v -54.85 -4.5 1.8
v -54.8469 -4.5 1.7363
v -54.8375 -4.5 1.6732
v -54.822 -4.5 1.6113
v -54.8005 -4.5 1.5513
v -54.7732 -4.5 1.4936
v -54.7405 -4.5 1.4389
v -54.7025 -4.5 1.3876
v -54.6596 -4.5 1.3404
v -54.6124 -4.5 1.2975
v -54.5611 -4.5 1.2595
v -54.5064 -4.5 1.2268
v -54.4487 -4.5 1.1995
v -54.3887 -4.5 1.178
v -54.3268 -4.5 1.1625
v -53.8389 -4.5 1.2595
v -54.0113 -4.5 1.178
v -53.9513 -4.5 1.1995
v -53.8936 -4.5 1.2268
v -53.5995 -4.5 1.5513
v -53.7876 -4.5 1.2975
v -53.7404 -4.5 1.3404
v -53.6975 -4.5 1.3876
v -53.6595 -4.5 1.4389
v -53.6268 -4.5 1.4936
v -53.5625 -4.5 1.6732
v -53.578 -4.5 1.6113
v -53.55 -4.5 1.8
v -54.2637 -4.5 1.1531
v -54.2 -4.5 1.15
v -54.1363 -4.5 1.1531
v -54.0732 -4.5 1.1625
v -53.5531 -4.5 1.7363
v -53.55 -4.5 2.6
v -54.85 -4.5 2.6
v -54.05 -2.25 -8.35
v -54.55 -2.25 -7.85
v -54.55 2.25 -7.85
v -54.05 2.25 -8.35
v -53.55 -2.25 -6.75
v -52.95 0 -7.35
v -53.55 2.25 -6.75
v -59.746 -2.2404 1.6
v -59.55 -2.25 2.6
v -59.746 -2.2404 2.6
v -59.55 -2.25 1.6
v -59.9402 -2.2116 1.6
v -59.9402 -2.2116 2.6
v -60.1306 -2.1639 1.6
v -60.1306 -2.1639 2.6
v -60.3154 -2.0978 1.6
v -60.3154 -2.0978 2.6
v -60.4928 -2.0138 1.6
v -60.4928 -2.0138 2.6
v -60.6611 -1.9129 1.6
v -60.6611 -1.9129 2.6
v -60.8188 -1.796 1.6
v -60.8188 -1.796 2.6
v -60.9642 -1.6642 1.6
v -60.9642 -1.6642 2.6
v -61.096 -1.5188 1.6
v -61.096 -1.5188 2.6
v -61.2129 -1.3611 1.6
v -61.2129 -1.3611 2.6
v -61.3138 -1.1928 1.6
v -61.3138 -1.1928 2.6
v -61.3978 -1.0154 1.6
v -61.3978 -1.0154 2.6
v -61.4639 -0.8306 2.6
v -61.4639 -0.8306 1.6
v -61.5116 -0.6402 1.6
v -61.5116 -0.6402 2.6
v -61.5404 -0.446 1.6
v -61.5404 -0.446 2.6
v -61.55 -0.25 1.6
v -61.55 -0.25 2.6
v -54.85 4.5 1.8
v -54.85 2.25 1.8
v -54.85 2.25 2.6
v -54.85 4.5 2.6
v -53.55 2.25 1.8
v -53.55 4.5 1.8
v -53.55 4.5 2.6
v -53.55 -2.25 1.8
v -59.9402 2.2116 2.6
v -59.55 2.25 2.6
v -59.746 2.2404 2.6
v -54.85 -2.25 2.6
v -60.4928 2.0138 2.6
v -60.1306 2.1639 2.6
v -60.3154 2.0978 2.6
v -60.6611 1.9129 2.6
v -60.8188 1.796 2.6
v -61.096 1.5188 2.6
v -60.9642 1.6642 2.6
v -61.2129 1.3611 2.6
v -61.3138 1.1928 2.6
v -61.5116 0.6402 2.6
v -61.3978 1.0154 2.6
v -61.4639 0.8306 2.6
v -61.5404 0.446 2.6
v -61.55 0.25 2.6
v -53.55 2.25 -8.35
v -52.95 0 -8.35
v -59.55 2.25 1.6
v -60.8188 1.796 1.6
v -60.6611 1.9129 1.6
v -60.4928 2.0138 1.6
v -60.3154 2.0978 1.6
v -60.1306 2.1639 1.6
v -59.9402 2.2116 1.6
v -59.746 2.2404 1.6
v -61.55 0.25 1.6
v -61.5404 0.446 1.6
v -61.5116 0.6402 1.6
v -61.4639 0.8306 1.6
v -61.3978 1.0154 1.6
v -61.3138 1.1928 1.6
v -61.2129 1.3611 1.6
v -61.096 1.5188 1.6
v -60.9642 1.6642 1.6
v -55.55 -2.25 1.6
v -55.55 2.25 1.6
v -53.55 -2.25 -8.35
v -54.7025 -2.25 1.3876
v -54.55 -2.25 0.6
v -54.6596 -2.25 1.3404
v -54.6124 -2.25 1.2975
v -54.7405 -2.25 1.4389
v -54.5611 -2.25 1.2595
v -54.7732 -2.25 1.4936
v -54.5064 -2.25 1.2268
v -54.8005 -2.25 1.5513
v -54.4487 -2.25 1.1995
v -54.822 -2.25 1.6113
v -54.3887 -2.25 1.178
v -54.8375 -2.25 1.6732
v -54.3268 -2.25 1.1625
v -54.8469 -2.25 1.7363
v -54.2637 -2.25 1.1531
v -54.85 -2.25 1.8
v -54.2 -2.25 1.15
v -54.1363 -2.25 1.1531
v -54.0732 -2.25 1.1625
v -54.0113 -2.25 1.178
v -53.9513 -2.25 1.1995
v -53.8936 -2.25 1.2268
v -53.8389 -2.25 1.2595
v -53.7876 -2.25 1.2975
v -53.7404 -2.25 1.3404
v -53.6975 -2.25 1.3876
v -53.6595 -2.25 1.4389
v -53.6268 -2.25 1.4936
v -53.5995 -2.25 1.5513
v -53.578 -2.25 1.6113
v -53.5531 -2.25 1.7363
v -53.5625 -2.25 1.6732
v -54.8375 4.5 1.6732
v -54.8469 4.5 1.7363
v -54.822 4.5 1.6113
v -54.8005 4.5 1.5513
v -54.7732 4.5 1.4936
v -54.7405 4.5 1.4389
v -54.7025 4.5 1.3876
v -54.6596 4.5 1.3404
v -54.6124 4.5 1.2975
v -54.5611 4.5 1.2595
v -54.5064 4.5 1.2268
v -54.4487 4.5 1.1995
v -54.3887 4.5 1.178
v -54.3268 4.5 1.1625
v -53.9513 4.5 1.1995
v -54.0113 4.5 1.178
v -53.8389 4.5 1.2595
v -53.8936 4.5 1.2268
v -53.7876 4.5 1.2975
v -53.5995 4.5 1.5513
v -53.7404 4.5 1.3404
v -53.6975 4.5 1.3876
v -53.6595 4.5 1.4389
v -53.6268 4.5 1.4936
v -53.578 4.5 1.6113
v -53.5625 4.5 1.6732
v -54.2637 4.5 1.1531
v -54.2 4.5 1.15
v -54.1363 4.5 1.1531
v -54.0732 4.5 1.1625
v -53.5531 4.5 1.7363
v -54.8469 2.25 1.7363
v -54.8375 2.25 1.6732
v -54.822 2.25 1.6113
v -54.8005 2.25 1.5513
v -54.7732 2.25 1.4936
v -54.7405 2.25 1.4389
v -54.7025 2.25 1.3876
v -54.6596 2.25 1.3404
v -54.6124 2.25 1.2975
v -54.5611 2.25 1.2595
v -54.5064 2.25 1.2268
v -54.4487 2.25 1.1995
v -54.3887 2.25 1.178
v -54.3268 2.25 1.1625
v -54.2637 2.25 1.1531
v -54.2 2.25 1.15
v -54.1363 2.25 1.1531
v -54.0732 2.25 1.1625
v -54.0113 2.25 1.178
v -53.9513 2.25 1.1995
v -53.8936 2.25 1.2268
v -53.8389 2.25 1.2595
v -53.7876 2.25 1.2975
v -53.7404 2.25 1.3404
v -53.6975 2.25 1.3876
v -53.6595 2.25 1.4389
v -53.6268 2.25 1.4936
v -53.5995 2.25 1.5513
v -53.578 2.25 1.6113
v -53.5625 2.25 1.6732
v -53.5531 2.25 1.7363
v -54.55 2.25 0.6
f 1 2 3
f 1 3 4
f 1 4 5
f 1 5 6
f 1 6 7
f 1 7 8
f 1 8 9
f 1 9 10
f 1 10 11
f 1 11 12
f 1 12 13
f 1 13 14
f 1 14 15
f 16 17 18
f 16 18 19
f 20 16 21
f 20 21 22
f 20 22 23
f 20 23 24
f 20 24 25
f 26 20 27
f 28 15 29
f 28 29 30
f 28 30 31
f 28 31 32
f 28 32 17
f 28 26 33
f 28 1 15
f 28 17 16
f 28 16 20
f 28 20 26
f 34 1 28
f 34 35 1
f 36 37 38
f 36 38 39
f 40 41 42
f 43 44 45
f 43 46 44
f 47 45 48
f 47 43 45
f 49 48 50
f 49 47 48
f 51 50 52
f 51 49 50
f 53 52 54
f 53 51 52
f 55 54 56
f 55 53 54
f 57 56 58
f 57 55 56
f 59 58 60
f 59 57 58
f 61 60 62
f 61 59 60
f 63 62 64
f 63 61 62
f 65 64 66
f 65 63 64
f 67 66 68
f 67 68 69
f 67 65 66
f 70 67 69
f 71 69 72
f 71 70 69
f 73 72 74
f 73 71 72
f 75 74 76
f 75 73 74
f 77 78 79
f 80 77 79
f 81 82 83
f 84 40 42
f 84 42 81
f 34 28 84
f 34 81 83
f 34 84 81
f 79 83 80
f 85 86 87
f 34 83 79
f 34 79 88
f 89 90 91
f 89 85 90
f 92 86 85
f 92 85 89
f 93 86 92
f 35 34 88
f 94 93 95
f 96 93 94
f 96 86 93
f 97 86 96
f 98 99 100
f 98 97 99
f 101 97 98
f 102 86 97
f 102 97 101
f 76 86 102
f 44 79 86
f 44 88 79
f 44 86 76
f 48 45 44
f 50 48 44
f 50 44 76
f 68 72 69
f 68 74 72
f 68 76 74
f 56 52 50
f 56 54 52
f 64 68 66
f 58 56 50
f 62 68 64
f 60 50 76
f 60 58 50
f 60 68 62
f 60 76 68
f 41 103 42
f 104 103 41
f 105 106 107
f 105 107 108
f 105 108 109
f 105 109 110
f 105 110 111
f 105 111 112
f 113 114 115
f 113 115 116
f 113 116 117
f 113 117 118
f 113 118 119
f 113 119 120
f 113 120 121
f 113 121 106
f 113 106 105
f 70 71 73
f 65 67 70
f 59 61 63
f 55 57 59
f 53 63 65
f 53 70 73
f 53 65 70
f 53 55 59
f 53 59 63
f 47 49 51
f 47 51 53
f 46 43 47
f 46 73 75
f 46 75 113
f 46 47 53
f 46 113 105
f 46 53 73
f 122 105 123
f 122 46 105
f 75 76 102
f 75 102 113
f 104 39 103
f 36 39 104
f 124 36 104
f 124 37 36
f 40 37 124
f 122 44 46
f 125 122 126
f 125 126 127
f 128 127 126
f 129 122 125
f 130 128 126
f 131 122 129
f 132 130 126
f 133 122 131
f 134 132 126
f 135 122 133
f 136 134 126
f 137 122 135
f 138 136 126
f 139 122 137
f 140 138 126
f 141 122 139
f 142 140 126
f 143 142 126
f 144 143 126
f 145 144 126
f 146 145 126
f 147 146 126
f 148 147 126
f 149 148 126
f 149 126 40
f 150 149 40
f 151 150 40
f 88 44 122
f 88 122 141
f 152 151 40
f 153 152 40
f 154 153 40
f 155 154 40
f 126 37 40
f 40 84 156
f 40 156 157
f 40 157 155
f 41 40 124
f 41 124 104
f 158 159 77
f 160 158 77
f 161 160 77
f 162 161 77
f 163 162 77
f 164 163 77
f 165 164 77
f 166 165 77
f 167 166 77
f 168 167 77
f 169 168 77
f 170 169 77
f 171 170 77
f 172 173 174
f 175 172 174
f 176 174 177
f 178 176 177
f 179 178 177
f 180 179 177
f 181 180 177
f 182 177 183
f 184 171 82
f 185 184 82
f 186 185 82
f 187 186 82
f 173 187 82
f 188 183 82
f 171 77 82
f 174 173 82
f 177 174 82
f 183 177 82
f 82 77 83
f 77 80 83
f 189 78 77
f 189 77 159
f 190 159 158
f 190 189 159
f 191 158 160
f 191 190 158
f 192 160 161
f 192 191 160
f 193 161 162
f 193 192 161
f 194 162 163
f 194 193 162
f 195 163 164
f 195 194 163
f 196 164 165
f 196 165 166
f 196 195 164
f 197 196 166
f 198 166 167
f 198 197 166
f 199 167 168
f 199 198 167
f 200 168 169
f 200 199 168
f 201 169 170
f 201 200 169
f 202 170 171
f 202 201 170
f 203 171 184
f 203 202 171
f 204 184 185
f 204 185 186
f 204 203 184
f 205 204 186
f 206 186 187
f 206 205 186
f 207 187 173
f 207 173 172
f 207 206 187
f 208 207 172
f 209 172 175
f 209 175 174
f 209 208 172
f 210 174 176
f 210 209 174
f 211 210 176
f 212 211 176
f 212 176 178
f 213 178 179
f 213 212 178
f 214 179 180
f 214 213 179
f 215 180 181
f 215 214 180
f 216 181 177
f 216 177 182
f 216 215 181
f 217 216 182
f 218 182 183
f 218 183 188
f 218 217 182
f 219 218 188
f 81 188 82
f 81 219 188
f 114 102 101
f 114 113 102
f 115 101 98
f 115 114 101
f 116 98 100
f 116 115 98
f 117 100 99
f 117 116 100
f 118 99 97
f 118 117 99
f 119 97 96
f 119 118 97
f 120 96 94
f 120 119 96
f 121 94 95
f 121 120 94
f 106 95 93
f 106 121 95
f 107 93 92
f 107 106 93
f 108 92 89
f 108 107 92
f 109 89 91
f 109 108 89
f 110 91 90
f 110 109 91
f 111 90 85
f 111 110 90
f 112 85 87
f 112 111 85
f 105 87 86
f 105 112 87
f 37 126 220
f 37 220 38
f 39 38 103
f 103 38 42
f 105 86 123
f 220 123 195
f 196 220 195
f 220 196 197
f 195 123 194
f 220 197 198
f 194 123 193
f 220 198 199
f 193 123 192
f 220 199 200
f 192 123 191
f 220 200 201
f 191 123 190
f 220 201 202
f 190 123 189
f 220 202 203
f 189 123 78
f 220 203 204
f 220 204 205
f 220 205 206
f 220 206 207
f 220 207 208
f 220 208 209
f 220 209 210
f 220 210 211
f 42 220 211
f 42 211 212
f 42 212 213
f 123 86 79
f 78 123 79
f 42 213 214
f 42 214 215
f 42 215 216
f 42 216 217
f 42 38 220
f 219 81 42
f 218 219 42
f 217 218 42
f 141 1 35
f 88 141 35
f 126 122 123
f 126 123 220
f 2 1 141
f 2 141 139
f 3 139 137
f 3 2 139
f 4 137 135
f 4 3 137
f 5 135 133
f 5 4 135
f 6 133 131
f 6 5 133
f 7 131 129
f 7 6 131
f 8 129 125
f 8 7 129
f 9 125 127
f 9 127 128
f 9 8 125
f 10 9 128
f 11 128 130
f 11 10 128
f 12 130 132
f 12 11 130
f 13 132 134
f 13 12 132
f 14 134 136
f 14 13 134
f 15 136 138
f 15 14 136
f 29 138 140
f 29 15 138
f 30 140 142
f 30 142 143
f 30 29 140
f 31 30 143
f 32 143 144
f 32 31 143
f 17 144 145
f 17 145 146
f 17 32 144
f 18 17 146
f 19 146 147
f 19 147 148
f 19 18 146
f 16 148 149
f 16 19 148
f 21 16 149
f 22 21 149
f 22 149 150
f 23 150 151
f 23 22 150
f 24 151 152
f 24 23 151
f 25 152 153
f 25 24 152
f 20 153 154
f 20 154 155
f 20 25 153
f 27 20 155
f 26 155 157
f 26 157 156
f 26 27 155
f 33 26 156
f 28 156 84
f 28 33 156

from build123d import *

# Parameters (mm, degrees)
PAD003_DEPTH         = 2.25
PAD004_DEPTH         = 4.5
POCKET013_DEPTH      = 33.508955
POCKET013_DEPTH_BACK = 43.758955
FILLET_R             = 2


with BuildPart() as part:
    # Sketch027 → Pad003 (new body, symmetric)
    with BuildSketch(Plane.XZ):
        Polygon((-61.55, 1.6), (-55.55, 1.6), (-54.55, 0.6), (-54.55, -7.85), (-54.05, -8.35), (-52.95, -8.35), (-52.95, -7.35), (-53.55, -6.75), (-53.55, 2.6), (-61.55, 2.6), align=None)
    extrude(amount=PAD003_DEPTH, both=True)

    # Sketch028 → Pad004 (join, symmetric)
    with BuildSketch(Plane.XZ):
        with BuildLine():
            ThreePointArc((-54.85, 1.8), (-54.2, 1.15), (-53.55, 1.8))
            Line((-53.55, 1.8), (-53.55, 2.6))
            Line((-53.55, 2.6), (-54.85, 2.6))
            Line((-54.85, 1.8), (-54.85, 2.6))
        make_face()
    extrude(amount=PAD004_DEPTH, both=True)

    # Sketch029 (on DatumPlane) → Pocket013 (cut, two sides)
    with BuildSketch(Plane.XY.offset(-8)) as pocket013_sk:
        Polygon((-52.95, 2.25), (-53.55, 2.25), (-52.95, 0), align=None)
    pocket013 = extrude(amount=-POCKET013_DEPTH, mode=Mode.SUBTRACT) + extrude(pocket013_sk.sketch, amount=POCKET013_DEPTH_BACK, mode=Mode.SUBTRACT)

    # Mirrored001: Pocket013 across XZ
    add(pocket013.mirror(Plane.XZ), mode=Mode.SUBTRACT)

    # Fillet
    fillet_edges = [part.edges().sort_by_distance(p)[0] for p in [
        (-61.55, 2.25, 2.1),
        (-61.55, -2.25, 2.1),
    ]]
    fillet(fillet_edges, radius=FILLET_R)


solid = part.part
